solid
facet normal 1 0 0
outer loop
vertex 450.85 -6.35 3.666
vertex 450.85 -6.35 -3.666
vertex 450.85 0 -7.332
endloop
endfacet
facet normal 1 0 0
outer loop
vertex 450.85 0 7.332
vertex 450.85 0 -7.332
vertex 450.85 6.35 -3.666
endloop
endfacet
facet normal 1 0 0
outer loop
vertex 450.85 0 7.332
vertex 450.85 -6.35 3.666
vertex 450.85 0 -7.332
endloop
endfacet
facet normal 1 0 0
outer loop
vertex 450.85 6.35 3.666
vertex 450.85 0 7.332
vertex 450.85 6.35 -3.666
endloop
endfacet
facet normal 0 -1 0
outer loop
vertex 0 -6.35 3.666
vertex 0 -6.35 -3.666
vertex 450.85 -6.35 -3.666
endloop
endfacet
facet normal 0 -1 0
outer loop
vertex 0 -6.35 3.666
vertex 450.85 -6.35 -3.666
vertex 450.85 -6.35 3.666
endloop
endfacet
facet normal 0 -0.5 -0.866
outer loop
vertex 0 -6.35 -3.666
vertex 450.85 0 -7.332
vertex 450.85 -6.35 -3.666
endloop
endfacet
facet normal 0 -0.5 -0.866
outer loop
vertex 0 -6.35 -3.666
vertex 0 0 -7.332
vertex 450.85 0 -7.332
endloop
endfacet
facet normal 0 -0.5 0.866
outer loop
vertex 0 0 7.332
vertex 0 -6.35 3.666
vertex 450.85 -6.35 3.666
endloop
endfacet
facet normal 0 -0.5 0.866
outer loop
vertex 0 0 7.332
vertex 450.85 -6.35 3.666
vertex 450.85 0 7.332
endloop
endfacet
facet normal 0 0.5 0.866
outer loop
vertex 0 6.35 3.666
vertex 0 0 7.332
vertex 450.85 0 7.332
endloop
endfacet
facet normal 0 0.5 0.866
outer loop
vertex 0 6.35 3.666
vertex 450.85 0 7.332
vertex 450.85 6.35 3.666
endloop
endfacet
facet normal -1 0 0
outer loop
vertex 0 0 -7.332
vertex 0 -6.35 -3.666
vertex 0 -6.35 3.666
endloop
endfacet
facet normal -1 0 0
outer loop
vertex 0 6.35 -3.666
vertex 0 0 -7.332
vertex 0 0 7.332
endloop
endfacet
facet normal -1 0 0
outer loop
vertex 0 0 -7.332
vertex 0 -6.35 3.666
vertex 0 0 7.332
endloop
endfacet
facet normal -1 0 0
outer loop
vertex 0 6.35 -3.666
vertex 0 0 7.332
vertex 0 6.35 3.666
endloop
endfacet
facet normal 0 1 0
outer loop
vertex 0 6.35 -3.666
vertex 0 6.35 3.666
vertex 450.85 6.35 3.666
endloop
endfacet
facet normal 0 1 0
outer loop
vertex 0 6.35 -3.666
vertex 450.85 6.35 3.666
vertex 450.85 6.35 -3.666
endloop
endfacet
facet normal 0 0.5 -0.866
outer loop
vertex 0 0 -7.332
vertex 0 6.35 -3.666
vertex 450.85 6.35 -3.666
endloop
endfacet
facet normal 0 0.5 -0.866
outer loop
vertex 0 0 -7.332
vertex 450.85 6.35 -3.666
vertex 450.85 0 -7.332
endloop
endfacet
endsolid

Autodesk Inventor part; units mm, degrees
ref_plane "YZ Plane" through (0, 0, 0) normal (1, 0, 0) x (0, 1, 0)
ref_plane "XZ Plane" through (0, 0, 0) normal (0, 1, 0) x (-1, 0, 0)
ref_plane "XY Plane" through (0, 0, 0) normal (0, 0, 1) x (1, 0, 0)
sketch "Sketch1" plane through (0, 0, 0) normal (1, 0, 0) x (0, 1, 0)
  line L0 (6.35, 3.6662) -> (6.35, -3.6662)
  line L1 (6.35, -3.6662) -> (0, -7.3323)
  line L2 (0, -7.3323) -> (-6.35, -3.6662)
  line L3 (-6.35, -3.6662) -> (-6.35, 3.6662)
  line L4 (-6.35, 3.6662) -> (0, 7.3323)
  line L5 (0, 7.3323) -> (6.35, 3.6662)
  point P0 (0, 0)
  dimension "d0" = 12.7
  dimension "d1" = 12.7
  dimension "d2" = 12.7
  dimension "d3" = 6.35
  dimension "d4" = 120
  dimension "d5" = 120
  dimension "d6" = 6.35
  dimension "d7" = 6.35
extrude "Extrusion1" add sketch "Sketch1" along normal blind 450.85
properties part number "0.5 hex shaft"
